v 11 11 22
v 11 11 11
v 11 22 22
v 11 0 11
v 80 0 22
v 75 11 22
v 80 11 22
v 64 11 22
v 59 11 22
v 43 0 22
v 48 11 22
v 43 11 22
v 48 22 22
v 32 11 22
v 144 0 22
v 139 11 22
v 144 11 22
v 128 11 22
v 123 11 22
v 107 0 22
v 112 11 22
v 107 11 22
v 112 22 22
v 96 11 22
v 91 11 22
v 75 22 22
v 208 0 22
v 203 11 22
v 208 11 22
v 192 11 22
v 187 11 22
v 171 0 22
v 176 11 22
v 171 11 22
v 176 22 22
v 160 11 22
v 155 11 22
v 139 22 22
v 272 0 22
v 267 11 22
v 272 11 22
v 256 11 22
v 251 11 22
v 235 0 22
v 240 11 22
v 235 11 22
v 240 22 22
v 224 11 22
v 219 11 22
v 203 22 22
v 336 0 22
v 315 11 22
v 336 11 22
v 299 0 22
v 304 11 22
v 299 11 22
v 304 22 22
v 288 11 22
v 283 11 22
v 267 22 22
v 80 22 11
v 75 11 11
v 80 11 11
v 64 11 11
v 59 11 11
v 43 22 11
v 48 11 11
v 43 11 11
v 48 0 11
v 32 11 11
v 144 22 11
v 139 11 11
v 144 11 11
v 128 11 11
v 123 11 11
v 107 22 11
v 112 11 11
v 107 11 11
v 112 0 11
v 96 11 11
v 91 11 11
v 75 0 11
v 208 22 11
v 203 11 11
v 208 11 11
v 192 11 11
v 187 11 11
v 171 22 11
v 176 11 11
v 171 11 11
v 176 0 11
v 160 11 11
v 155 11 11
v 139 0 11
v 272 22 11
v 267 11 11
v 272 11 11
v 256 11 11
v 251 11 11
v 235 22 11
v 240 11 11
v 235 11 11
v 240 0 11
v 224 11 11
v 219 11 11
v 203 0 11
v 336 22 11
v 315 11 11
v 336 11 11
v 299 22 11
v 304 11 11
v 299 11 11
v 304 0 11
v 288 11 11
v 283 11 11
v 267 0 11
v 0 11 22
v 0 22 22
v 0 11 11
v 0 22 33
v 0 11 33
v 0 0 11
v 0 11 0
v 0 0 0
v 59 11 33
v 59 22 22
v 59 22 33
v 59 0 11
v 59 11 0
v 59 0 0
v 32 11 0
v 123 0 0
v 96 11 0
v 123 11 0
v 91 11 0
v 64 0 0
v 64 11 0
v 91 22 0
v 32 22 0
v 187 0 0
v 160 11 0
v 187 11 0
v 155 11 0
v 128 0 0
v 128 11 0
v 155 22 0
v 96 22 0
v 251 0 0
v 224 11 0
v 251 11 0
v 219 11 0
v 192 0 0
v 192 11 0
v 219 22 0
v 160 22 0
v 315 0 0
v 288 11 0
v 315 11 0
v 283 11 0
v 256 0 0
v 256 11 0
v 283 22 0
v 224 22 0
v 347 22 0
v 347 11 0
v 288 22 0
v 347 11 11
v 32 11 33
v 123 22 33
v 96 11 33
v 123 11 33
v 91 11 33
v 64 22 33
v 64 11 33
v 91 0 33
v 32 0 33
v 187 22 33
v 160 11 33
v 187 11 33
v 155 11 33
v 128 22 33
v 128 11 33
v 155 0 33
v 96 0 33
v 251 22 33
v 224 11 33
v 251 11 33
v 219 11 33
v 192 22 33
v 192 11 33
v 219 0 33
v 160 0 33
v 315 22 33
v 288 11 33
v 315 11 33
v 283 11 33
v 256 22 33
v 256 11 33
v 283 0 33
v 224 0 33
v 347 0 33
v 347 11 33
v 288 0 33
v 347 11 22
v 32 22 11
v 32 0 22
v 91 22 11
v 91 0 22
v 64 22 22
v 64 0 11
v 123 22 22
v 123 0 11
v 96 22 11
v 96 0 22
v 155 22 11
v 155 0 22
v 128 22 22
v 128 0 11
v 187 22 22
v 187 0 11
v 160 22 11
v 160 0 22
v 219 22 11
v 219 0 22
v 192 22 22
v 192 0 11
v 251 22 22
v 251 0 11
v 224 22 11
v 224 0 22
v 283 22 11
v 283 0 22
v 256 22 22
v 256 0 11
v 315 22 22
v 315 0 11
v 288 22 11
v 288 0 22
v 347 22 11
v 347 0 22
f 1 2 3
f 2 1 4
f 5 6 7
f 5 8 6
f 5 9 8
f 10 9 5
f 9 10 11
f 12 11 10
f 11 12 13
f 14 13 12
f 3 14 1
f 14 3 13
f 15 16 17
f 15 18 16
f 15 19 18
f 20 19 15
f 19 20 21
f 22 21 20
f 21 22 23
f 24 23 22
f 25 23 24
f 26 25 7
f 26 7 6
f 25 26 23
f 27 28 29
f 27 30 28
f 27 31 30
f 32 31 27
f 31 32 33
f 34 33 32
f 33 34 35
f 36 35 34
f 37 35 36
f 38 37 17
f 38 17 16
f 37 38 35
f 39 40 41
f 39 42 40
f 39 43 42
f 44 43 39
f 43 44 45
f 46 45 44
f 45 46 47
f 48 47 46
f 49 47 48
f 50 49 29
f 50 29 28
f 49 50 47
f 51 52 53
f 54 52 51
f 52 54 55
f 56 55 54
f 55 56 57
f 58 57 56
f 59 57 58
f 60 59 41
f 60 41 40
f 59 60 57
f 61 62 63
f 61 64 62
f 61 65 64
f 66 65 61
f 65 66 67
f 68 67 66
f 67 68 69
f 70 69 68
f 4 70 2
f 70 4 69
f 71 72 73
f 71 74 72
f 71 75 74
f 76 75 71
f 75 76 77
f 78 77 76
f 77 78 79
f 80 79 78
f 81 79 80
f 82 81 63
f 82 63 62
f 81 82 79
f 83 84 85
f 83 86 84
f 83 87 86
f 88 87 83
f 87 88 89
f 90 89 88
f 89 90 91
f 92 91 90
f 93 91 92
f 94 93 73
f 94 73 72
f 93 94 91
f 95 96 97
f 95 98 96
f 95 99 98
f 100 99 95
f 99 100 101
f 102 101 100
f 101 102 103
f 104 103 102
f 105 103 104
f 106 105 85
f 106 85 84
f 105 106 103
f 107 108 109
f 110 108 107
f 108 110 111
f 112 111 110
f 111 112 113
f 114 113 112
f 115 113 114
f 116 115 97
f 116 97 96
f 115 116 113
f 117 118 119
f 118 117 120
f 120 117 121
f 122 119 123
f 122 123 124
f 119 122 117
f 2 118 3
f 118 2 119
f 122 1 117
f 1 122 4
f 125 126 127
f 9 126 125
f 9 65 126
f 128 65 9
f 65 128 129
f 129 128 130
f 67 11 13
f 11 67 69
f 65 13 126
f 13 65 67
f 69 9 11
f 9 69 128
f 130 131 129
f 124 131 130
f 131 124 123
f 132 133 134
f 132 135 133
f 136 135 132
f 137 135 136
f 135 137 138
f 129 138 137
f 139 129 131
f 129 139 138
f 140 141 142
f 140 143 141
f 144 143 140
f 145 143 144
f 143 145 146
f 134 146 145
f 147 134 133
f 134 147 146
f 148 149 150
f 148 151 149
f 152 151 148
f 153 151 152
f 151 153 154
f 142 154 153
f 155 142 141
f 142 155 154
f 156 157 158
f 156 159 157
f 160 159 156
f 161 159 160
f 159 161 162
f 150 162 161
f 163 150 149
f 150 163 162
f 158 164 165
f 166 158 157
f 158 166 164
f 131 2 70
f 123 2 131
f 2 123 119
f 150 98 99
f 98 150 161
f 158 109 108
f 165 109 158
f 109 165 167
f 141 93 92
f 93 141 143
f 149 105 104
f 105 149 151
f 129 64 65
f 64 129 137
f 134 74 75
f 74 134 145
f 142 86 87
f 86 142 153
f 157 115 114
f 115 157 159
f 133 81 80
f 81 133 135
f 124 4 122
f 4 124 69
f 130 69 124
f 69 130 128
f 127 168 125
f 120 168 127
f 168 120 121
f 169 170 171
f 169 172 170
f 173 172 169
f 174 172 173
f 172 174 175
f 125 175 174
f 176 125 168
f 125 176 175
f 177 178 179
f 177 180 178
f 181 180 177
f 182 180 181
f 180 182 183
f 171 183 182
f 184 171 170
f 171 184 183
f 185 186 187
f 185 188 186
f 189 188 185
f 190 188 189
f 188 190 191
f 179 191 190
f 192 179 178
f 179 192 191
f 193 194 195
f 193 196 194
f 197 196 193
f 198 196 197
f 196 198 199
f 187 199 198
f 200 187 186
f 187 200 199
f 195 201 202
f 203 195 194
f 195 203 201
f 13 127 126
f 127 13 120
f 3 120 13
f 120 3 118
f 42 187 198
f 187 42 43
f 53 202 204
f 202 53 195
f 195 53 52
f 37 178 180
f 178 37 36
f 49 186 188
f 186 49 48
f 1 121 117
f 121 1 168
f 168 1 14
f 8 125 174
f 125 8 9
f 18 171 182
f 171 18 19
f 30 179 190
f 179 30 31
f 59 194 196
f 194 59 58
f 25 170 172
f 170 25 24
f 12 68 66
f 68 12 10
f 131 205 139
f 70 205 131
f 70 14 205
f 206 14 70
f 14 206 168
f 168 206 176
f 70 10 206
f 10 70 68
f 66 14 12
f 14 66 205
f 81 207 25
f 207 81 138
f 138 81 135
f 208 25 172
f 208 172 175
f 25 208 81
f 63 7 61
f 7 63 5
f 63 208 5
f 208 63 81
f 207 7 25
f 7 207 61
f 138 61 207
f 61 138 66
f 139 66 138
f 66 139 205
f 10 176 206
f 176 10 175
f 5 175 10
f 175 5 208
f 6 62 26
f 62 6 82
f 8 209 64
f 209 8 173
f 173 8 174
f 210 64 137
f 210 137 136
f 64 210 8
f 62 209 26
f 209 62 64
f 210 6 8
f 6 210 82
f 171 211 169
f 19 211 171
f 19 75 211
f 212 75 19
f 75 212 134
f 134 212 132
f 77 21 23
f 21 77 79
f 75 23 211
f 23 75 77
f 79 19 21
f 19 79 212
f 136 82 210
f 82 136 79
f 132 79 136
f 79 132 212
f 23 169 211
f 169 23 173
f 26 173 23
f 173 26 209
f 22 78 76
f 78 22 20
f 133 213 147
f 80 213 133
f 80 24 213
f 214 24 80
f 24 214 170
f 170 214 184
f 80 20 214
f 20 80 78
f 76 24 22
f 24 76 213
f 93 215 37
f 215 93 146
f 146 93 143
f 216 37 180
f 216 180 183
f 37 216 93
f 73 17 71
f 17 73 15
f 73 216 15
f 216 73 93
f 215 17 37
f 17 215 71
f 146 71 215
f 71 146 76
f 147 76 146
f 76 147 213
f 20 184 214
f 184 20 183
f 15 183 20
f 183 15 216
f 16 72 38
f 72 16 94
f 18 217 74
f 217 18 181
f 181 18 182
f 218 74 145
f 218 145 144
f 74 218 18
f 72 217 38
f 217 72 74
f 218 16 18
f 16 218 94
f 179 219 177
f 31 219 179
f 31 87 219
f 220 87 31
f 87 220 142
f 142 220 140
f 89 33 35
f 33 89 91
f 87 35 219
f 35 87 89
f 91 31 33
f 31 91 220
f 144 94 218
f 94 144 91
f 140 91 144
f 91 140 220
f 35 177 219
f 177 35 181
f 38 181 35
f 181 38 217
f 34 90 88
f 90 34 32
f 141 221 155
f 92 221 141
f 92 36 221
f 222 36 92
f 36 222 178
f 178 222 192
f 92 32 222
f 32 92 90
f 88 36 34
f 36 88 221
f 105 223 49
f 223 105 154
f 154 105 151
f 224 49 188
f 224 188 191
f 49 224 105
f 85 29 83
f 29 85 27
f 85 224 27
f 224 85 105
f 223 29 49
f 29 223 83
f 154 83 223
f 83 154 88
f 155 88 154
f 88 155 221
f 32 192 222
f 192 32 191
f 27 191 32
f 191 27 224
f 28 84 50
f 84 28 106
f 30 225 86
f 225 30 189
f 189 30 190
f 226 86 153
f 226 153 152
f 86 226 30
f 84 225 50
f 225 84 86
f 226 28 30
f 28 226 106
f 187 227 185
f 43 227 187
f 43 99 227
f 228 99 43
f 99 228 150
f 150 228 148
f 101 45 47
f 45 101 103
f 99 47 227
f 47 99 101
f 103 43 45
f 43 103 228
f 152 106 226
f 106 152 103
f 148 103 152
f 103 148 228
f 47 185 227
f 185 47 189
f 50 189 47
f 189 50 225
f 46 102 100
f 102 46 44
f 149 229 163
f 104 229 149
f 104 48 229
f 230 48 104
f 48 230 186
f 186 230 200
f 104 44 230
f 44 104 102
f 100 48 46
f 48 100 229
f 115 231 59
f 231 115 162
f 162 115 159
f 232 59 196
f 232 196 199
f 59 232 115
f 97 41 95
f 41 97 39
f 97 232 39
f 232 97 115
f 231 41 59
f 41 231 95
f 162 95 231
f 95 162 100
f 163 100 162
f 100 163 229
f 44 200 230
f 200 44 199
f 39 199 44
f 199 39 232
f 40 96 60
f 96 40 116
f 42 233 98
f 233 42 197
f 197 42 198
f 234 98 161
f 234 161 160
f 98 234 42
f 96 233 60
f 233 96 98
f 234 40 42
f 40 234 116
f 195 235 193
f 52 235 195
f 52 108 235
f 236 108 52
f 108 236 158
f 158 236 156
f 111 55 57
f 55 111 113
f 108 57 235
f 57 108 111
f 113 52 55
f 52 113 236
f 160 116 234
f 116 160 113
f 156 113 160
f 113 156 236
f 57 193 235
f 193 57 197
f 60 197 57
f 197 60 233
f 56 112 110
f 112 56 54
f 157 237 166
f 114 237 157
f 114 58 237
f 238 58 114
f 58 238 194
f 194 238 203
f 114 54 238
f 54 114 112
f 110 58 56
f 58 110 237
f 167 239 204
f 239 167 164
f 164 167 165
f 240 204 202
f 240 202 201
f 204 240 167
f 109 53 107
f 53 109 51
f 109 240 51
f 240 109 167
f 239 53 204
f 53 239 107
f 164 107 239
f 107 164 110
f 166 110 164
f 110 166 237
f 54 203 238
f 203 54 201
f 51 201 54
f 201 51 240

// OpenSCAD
gap = 5;
thickness = 11;

square_chain(gap, thickness, 10);

module square_chain(gap, thickness, length) {
    for (i = [0: length - 1]) {
        translate([(thickness*2 + gap*2 ) * i, i%2 ==0?0:(2*thickness), 0])
        scale([1, i%2==0?1:-1, 1]) {
            square_link(gap, thickness);
        }
            
    }
}

module square_link(gap, thickness) {
    union(){
        cube([thickness*4 + gap*3, thickness, thickness]);

        translate([0, thickness, thickness * 2 ])
            cube([thickness*4 + gap*3, thickness, thickness]);

        translate([0, 0, thickness]){
            square_pilar(thickness);
            translate([thickness * 3 + gap * 3 , 0, 0])
                square_pilar(thickness);
        }
    }
}

module square_pilar(thickness) {
    multmatrix(m = [
        [1, 0, 0, 0],
        [0, 1, tan(45), 0],
        [0, 0, 1, 0],
        [0, 0, 0, 1]
        ])

    cube(thickness);
}
